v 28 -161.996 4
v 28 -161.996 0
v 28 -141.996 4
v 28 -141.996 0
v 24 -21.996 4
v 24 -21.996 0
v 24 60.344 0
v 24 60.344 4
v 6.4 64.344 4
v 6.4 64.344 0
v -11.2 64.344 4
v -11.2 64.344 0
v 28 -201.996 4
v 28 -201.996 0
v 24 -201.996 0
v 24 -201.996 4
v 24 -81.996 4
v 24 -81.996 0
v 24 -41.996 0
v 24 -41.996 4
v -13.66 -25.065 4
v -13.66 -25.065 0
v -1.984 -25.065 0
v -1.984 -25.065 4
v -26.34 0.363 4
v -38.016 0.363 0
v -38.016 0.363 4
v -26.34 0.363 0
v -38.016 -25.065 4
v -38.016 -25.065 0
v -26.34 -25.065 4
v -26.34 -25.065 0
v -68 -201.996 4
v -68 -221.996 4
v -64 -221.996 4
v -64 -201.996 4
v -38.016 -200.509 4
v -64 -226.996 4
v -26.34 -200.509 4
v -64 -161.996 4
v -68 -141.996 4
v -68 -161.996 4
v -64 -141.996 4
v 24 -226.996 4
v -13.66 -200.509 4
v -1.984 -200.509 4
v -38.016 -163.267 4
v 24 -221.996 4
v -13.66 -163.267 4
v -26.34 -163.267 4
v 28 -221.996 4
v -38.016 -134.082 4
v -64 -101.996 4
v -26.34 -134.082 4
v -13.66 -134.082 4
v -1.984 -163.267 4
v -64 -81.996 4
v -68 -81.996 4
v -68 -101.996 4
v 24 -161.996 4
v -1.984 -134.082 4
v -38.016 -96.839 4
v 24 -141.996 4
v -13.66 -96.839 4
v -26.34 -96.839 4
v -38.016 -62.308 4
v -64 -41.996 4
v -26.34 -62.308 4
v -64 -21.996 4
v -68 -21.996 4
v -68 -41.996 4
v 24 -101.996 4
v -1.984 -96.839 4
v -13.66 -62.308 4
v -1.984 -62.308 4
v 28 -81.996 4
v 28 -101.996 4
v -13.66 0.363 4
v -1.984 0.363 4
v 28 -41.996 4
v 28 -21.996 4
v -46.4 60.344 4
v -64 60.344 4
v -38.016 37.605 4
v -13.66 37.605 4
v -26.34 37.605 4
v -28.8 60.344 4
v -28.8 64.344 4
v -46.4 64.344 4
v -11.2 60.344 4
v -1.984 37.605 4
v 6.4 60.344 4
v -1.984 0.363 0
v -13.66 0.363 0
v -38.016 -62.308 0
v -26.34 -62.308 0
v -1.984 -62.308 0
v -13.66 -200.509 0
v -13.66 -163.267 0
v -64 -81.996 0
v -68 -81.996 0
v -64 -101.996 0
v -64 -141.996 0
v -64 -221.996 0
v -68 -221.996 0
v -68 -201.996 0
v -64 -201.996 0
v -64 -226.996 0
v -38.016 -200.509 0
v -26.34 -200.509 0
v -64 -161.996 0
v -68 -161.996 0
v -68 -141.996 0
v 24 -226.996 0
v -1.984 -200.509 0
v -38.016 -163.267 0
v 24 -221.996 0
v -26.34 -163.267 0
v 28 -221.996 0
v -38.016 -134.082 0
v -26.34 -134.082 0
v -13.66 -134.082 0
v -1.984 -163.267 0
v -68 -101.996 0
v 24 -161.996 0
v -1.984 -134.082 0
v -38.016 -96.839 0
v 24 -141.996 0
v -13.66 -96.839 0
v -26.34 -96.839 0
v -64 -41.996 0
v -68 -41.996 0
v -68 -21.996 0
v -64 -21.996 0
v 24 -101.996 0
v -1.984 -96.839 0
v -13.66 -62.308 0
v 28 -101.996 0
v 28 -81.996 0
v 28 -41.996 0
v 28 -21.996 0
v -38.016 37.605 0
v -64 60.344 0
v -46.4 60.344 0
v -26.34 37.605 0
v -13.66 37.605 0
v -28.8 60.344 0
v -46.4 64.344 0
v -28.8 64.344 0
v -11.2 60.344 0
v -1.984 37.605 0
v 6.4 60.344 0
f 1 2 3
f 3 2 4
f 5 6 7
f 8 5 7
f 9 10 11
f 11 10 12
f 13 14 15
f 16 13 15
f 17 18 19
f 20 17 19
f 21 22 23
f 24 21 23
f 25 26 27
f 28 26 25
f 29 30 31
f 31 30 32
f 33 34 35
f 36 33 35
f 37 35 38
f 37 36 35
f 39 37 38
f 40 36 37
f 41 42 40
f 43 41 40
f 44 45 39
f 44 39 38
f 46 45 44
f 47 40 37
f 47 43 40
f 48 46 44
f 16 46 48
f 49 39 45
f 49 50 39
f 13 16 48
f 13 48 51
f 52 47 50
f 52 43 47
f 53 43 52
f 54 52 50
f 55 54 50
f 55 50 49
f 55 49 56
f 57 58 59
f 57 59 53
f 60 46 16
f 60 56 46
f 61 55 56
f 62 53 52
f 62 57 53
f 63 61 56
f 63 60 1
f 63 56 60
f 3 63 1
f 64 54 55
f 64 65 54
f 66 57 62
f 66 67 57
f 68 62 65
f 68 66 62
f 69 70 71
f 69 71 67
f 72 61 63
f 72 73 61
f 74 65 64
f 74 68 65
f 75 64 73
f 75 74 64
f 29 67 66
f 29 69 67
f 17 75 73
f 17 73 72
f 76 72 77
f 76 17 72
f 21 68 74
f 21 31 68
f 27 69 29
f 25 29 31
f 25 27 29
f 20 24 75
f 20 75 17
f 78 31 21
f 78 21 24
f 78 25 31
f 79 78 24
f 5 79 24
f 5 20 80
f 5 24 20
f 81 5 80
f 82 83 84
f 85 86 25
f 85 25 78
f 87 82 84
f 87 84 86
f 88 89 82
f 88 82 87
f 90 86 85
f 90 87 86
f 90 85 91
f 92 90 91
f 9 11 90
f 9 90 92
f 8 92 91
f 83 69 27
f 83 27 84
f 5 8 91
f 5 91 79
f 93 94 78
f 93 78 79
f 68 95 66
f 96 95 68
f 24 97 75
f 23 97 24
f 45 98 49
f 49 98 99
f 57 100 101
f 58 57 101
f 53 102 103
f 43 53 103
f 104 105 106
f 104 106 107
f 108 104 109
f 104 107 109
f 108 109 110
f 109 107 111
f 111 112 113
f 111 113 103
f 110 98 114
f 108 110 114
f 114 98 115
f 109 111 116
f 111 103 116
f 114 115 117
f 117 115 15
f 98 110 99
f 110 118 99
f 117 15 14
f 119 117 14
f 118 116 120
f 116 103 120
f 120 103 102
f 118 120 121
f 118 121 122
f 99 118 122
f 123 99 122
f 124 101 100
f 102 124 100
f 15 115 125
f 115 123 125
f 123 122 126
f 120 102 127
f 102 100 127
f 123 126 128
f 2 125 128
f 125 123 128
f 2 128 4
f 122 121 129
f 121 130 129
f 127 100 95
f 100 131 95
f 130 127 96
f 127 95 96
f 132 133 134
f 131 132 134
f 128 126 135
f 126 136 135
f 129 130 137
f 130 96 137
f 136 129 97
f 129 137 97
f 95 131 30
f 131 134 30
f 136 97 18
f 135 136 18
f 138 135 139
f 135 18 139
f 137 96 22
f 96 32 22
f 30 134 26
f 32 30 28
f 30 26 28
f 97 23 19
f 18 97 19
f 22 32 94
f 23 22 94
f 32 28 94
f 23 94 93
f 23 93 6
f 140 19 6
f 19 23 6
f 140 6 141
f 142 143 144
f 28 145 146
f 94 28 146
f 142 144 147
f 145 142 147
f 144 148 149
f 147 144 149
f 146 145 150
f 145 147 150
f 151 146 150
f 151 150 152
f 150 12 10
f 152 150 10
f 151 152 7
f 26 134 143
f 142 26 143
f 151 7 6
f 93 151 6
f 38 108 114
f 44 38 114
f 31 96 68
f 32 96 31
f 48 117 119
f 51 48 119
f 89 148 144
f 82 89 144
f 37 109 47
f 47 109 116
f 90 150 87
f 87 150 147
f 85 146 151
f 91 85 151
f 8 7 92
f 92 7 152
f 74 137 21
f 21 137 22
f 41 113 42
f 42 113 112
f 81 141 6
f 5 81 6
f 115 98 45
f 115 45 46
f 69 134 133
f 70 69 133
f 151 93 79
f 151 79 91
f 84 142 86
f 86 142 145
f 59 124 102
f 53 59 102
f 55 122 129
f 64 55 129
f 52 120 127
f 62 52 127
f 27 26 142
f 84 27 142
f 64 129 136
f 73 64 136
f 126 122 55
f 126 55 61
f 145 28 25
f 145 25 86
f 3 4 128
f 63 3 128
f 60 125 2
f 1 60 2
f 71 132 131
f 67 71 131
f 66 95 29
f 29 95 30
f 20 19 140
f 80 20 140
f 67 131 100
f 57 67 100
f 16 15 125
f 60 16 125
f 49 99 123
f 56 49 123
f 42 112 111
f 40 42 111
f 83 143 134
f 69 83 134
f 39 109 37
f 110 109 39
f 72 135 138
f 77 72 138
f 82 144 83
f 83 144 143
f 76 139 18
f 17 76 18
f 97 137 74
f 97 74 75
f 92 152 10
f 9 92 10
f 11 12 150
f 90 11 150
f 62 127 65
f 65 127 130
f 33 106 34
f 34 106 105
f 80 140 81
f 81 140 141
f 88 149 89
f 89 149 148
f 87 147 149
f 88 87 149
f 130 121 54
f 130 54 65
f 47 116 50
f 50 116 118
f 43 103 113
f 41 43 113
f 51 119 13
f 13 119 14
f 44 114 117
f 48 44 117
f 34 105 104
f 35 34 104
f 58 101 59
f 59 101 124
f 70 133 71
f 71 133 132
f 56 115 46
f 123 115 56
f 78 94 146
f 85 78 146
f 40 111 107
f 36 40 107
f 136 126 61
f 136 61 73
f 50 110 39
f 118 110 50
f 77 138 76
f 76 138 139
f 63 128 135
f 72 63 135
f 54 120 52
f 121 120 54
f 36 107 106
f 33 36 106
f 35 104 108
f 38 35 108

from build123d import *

# Parameters (mm, degrees)
SKETCH1_W           = 11.675882566
SKETCH1_H           = 37.242609939
SKETCH1_H_2         = 37.242609938
BOSS_EXTRUDE1_DEPTH = 4


with BuildPart() as part:
    # Sketch1 → Boss-Extrude1 (new body)
    with BuildSketch(Plane.XY):
        Polygon((6.4, 64.343953413), (-11.2, 64.343953413), (-11.2, 60.343953413), (-28.8, 60.343953413), (-28.8, 64.343953413), (-46.4, 64.343953413), (-46.4, 60.343953413), (-64, 60.343953413), (-64, -21.996281697), (-68, -21.996281697), (-68, -41.996281697), (-64, -41.996281697), (-64, -81.996281697), (-68, -81.996281697), (-68, -101.996281697), (-64, -101.996281697), (-64, -141.996281697), (-68, -141.996281697), (-68, -161.996281697), (-64, -161.996281697), (-64, -201.996281697), (-68, -201.996281697), (-68, -221.996281697), (-64, -221.996281697), (-64, -226.996281697), (24, -226.996281697), (24, -221.996281697), (28, -221.996281697), (28, -201.996281697), (24, -201.996281697), (24, -161.996281697), (28, -161.996281697), (28, -141.996281697), (24, -141.996281697), (24, -101.996281697), (28, -101.996281697), (28, -81.996281697), (24, -81.996281697), (24, -41.996281697), (28, -41.996281697), (28, -21.996281697), (24, -21.996281697), (24, 60.343953413), (6.4, 60.343953413), align=None)
        with Locations((-32.17836291, -181.887864713)):
            Rectangle(SKETCH1_W, SKETCH1_H, mode=Mode.SUBTRACT)
        with Locations((-7.82163709, 18.983890438)):
            Rectangle(SKETCH1_W, SKETCH1_H, mode=Mode.SUBTRACT)
        with Locations((-7.82163709, -43.686747162)):
            Rectangle(SKETCH1_W, SKETCH1_H, mode=Mode.SUBTRACT)
        with Locations((-7.82163709, -115.460501141)):
            Rectangle(SKETCH1_W, SKETCH1_H_2, mode=Mode.SUBTRACT)
        with Locations((-7.82163709, -181.887864713)):
            Rectangle(SKETCH1_W, SKETCH1_H, mode=Mode.SUBTRACT)
        with Locations((-32.17836291, -115.460501141)):
            Rectangle(SKETCH1_W, SKETCH1_H_2, mode=Mode.SUBTRACT)
        with Locations((-32.17836291, -43.686747162)):
            Rectangle(SKETCH1_W, SKETCH1_H, mode=Mode.SUBTRACT)
        with Locations((-32.17836291, 18.983890438)):
            Rectangle(SKETCH1_W, SKETCH1_H, mode=Mode.SUBTRACT)
    extrude(amount=BOSS_EXTRUDE1_DEPTH)


solid = part.part
